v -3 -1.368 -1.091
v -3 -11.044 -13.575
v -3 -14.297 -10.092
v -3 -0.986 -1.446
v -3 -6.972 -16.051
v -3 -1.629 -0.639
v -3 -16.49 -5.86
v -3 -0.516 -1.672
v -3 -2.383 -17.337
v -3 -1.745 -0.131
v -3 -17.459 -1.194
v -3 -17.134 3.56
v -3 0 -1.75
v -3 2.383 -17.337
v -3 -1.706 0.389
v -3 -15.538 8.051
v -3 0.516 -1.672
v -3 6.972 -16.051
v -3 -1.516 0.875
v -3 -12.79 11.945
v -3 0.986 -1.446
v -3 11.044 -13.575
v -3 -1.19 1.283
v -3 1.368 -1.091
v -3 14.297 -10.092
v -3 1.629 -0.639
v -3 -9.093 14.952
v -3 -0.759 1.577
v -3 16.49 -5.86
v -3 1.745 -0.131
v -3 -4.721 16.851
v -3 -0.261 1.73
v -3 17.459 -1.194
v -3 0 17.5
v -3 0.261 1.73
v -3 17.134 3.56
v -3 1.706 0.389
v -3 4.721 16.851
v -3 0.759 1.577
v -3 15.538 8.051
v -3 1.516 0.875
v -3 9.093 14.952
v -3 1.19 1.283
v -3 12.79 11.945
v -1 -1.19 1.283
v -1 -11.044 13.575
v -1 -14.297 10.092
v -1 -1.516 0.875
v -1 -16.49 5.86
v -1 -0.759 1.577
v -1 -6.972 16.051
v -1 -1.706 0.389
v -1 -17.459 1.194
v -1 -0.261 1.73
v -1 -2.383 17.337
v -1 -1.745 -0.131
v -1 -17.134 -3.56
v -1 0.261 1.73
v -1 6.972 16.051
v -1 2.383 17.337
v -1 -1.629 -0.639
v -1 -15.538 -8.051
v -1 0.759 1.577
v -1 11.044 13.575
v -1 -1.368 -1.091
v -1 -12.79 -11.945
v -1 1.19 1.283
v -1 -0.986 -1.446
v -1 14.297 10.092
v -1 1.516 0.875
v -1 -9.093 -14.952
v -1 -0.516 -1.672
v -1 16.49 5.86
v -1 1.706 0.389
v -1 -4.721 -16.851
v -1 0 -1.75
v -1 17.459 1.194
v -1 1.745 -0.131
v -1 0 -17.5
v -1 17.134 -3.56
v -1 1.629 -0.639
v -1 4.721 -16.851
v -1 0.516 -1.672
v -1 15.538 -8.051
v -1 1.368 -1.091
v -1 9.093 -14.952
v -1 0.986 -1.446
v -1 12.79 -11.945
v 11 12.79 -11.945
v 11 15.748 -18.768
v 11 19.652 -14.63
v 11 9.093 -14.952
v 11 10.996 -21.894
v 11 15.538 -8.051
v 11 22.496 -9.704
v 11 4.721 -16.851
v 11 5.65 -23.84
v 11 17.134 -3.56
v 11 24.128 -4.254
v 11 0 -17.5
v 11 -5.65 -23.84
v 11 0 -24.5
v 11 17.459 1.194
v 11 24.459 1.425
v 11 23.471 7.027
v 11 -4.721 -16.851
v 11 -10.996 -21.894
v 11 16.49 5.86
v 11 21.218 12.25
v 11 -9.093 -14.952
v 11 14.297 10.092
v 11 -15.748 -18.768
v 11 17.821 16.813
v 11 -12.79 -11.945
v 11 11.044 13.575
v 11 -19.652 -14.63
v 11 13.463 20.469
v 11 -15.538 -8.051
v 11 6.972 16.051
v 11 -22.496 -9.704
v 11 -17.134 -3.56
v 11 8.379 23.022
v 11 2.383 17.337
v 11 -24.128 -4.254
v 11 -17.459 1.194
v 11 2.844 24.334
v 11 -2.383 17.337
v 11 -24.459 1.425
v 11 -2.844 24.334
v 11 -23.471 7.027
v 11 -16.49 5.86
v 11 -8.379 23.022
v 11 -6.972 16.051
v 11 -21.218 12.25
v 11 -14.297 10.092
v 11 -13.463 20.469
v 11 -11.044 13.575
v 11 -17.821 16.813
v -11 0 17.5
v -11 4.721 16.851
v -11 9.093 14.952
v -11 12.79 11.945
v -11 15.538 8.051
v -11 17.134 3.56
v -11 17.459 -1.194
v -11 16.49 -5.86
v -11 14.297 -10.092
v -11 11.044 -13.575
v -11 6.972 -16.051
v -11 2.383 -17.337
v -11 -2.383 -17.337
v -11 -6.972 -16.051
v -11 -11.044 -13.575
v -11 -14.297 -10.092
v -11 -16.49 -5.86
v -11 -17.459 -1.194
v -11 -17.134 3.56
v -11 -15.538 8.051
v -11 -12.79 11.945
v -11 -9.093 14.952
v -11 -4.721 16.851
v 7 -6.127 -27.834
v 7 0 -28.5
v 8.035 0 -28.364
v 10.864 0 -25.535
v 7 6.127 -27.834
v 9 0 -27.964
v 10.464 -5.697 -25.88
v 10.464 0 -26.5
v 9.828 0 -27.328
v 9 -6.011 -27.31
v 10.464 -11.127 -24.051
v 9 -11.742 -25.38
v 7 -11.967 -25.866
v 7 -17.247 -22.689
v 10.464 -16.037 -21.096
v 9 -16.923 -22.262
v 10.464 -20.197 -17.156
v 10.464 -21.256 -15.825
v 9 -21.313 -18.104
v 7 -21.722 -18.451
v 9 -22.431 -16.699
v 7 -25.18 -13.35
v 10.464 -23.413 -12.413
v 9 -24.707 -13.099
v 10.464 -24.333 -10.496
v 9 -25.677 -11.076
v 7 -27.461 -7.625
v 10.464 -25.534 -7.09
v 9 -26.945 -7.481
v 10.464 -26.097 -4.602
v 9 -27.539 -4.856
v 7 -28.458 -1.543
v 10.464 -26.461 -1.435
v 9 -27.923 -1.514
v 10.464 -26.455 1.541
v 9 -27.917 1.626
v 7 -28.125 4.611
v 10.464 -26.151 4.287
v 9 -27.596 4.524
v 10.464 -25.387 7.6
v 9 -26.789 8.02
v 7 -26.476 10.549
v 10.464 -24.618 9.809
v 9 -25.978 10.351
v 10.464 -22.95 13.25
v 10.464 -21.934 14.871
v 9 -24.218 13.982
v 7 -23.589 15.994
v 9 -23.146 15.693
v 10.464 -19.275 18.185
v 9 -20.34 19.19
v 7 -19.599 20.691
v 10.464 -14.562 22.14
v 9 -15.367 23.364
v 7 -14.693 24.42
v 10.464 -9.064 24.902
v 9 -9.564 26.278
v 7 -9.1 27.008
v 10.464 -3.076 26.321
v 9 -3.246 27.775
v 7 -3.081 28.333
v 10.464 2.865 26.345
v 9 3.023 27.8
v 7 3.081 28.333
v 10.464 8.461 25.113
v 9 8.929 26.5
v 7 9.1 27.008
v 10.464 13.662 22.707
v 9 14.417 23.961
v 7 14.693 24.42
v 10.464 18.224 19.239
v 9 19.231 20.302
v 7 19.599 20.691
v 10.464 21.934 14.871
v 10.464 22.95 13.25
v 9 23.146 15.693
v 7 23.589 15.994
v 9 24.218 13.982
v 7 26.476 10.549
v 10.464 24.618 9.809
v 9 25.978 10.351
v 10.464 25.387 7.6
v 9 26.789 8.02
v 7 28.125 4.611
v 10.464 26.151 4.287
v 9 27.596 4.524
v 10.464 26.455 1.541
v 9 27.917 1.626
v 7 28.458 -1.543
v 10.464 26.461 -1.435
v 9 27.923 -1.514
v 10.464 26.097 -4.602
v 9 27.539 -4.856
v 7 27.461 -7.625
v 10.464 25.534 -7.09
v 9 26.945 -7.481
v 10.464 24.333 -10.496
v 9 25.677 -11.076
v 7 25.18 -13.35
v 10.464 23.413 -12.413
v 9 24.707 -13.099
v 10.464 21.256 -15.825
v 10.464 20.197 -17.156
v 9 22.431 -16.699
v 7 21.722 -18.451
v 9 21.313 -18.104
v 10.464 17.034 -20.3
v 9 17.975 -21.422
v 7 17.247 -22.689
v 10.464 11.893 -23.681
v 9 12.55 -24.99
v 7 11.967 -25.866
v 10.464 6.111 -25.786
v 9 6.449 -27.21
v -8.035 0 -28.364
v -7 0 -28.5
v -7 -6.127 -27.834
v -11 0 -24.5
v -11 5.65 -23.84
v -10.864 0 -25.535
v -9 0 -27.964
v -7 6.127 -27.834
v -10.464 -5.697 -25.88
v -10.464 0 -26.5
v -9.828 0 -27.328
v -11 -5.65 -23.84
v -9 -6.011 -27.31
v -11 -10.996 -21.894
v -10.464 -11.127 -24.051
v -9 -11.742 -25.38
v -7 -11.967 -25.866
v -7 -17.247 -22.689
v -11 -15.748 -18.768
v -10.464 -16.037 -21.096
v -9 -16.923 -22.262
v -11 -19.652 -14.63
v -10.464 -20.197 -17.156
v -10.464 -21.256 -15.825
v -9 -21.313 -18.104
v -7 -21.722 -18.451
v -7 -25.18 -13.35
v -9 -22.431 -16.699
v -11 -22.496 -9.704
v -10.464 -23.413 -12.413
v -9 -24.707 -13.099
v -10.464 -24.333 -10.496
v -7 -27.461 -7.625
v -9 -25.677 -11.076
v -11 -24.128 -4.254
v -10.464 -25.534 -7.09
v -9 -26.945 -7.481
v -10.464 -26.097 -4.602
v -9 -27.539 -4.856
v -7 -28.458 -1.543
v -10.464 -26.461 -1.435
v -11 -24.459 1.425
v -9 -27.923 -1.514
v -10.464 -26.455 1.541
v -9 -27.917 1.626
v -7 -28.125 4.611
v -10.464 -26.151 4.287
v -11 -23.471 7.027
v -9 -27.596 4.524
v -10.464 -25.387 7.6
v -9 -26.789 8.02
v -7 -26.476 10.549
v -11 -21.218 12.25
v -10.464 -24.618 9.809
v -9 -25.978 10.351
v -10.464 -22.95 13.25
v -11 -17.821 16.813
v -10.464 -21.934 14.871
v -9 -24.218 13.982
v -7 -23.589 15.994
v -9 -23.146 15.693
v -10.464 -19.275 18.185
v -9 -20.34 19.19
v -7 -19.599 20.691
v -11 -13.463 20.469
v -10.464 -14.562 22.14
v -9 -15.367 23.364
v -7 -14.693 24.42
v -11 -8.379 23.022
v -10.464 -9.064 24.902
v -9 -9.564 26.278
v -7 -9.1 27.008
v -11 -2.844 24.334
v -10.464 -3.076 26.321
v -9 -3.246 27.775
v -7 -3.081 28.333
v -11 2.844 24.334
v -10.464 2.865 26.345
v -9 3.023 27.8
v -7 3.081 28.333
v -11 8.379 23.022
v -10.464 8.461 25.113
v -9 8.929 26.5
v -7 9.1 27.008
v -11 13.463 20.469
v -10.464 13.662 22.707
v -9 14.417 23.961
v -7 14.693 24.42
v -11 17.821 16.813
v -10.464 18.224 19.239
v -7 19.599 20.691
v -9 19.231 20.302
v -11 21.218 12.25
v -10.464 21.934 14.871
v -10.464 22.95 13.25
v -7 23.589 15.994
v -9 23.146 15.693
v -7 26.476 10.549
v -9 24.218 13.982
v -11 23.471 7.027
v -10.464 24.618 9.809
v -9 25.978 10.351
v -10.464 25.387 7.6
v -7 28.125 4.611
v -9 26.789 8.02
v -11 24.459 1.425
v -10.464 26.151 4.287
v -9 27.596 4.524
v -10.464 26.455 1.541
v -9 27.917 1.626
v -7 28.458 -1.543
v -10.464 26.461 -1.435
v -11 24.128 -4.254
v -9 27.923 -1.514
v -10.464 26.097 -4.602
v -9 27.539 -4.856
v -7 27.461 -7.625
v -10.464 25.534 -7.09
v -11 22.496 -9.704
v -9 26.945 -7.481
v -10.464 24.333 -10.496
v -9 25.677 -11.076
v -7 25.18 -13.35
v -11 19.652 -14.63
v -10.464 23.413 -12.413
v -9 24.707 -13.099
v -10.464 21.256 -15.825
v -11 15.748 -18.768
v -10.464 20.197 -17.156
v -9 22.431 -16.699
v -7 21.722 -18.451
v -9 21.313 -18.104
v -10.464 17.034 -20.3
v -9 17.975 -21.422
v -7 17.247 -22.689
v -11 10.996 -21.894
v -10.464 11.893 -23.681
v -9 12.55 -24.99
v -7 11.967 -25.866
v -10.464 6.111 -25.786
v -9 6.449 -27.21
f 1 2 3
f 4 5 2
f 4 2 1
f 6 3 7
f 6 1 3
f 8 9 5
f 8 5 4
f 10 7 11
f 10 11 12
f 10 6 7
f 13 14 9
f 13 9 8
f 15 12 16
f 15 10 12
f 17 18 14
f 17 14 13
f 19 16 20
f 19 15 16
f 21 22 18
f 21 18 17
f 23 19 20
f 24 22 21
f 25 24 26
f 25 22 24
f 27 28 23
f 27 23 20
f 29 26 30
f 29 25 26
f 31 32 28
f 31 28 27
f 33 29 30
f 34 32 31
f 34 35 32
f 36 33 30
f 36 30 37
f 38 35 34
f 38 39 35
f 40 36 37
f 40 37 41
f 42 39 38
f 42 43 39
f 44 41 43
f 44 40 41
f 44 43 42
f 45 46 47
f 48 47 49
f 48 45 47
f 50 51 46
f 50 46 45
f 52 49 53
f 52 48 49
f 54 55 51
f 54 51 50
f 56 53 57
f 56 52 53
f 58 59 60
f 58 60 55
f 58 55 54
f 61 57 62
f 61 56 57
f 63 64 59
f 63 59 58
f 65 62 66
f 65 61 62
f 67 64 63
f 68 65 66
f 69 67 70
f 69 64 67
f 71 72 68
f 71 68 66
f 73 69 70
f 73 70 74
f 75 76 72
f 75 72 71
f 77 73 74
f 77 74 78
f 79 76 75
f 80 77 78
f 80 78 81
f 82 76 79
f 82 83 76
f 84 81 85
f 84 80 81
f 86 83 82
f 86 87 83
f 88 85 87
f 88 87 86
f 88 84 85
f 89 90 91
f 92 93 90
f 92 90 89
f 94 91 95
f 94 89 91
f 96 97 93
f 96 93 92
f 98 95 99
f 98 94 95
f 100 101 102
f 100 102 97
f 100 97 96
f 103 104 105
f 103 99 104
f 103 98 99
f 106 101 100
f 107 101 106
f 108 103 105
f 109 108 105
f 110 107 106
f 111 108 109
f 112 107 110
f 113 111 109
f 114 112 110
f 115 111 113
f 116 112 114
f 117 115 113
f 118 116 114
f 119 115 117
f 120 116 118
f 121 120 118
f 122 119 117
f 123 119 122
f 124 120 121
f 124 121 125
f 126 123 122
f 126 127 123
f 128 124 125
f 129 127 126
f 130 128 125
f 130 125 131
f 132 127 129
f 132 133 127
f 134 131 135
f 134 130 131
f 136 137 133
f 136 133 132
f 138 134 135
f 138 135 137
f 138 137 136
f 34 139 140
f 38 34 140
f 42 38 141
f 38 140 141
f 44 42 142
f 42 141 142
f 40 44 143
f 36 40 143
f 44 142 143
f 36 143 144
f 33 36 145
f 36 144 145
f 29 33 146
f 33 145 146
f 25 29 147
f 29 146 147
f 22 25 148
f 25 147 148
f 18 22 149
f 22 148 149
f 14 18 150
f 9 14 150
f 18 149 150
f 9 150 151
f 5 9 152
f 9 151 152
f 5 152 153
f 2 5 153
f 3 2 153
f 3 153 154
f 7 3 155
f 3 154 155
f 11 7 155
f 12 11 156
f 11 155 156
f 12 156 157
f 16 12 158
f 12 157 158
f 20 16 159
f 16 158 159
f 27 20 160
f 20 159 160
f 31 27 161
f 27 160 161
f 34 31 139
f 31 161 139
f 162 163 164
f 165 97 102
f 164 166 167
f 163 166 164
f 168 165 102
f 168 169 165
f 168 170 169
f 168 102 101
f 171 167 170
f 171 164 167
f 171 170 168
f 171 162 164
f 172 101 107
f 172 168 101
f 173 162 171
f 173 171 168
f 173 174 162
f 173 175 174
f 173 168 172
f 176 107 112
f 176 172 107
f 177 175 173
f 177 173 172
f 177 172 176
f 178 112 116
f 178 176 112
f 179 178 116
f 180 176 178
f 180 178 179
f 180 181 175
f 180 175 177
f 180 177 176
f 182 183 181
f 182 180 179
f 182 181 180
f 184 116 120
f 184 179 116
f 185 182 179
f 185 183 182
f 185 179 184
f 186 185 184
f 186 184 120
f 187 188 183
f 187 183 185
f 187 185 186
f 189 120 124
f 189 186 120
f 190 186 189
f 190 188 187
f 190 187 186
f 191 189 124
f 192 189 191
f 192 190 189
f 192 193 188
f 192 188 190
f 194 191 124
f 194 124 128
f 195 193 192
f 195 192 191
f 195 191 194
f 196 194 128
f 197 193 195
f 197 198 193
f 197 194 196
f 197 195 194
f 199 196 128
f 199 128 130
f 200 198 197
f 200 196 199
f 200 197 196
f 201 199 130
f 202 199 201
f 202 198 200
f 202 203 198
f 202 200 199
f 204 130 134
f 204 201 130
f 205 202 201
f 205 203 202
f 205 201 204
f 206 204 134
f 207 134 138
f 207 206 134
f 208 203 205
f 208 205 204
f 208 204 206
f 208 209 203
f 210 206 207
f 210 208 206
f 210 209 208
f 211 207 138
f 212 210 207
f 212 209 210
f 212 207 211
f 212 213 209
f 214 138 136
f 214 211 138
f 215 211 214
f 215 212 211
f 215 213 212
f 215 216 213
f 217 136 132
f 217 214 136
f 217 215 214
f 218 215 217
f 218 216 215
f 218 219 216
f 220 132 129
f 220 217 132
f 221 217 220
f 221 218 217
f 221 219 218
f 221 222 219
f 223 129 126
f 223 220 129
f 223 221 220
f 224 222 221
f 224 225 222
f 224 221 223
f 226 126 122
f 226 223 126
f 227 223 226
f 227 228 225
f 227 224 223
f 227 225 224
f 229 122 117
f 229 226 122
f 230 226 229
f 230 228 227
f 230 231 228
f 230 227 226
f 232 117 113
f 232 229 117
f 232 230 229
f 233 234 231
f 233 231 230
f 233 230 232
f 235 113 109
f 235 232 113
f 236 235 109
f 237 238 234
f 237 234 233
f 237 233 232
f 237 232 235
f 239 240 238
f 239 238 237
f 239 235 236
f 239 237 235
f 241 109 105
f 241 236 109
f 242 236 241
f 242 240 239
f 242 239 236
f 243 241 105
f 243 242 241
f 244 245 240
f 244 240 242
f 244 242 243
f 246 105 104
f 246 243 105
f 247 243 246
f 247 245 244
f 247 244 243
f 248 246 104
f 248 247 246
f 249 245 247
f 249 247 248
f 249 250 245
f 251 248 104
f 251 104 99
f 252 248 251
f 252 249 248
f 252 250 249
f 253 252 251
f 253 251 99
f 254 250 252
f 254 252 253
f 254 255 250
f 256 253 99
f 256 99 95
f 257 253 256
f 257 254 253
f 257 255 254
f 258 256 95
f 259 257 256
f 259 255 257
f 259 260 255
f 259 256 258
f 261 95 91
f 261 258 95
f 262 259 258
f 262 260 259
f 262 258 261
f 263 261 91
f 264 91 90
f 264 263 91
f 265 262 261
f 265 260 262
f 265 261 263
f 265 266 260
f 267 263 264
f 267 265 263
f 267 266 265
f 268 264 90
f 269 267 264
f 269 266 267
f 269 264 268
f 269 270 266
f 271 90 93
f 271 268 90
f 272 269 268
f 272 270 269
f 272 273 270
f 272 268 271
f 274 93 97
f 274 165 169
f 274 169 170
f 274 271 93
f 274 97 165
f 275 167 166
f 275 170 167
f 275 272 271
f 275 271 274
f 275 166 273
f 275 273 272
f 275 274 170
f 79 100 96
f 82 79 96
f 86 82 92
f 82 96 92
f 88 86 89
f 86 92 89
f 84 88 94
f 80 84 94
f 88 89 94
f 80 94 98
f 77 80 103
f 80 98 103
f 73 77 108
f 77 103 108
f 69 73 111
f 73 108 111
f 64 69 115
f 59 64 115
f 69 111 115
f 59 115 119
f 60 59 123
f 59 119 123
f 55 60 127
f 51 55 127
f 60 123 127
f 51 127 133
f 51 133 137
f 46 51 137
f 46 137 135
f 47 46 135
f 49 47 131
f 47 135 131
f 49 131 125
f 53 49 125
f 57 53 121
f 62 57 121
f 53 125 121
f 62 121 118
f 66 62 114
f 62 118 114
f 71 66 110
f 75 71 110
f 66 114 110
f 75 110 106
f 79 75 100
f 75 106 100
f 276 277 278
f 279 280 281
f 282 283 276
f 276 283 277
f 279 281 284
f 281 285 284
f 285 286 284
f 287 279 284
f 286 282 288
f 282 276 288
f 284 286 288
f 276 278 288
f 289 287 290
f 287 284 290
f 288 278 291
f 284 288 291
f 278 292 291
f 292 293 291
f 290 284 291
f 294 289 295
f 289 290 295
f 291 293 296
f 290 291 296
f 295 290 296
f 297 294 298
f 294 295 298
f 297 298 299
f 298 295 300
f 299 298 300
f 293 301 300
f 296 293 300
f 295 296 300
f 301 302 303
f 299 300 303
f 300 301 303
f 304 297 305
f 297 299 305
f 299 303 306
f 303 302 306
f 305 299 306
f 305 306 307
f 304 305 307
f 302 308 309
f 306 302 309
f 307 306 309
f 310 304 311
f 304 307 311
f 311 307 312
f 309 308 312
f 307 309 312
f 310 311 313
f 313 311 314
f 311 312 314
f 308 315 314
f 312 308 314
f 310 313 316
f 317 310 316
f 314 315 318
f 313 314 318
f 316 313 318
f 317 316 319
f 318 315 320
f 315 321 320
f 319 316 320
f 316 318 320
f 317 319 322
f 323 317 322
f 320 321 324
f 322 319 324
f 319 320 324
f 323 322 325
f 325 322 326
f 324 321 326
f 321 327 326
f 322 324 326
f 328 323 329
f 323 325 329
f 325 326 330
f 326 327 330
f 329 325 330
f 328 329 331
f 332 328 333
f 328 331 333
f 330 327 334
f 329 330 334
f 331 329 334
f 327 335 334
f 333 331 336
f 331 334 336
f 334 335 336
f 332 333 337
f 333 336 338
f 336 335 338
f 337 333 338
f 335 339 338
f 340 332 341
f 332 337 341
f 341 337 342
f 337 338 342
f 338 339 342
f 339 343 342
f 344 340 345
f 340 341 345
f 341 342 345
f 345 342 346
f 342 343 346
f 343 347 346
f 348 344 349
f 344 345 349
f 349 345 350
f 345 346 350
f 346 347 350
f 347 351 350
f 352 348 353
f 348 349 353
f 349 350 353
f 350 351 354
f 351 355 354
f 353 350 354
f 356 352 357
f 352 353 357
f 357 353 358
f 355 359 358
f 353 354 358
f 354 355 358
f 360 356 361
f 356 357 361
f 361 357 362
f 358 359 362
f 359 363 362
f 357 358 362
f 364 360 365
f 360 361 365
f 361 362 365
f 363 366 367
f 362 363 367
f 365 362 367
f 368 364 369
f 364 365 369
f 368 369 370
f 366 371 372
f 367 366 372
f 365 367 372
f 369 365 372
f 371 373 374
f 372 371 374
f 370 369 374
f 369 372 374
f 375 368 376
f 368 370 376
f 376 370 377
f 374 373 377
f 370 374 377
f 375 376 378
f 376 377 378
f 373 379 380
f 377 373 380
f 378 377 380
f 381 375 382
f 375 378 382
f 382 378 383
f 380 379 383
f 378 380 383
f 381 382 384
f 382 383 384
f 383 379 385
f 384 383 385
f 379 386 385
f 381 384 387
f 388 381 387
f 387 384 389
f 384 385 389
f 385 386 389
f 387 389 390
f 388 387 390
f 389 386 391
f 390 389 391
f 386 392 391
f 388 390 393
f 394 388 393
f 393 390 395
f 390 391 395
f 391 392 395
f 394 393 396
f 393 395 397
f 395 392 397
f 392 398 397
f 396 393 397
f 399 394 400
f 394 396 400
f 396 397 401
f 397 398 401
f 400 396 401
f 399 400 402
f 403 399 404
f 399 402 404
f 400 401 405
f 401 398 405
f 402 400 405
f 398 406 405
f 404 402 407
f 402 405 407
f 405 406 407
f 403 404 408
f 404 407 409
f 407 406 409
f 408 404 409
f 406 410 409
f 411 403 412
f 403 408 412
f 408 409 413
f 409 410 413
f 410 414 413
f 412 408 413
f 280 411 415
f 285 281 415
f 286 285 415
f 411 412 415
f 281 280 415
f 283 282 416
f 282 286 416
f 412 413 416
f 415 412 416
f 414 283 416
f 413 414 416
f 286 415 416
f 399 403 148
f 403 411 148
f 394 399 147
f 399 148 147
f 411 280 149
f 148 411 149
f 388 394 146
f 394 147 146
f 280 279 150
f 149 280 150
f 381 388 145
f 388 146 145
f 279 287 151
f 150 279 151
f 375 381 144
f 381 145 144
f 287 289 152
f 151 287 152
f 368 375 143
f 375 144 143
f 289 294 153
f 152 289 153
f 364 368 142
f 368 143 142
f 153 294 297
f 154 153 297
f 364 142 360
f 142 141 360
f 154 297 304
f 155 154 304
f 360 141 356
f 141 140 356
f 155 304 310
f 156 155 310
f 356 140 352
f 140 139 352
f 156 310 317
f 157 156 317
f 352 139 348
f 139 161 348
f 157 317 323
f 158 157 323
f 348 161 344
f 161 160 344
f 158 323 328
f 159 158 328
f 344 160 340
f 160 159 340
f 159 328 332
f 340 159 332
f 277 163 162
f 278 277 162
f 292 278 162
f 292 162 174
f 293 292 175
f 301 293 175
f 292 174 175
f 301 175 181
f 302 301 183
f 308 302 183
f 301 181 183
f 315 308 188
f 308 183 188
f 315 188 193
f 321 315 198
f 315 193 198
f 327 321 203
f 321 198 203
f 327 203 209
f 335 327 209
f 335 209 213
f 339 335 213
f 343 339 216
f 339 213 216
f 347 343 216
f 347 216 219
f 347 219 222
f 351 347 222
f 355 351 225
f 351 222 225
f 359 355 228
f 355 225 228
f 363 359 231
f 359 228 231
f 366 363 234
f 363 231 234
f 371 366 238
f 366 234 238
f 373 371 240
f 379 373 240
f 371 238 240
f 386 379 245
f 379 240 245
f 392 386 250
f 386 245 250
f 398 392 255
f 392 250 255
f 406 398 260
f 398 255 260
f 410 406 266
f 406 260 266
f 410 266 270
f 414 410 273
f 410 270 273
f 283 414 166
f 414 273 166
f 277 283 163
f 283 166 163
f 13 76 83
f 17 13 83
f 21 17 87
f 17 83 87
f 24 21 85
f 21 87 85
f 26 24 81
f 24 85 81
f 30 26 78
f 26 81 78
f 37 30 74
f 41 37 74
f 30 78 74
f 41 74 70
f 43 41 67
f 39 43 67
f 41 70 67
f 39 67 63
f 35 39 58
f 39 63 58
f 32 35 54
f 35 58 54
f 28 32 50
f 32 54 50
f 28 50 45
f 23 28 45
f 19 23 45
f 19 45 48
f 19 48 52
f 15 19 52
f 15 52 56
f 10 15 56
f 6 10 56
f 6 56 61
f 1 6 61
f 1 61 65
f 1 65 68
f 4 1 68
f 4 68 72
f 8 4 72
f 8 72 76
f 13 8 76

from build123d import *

# Parameters (mm, degrees)
SKETCH1_W          = 22
SKETCH1_H          = 28.5
FILLET1_R          = 4
SKETCH2_R          = 17.5
CUT_EXTRUDE1_DEPTH = 12
SKETCH3_R          = 17.5
CUT_EXTRUDE2_DEPTH = 8
SKETCH4_R          = 1.75
CUT_EXTRUDE3_DEPTH = 11


with BuildPart() as part:
    # Sketch1 → Revolve1 (revolve)
    with BuildSketch(Plane(origin=(0, 0, 0), x_dir=(1, 0, 0), z_dir=(0, 1, 0))):
        with Locations((0, 14.25)):
            Rectangle(SKETCH1_W, SKETCH1_H)
    revolve(axis=Axis((11, 0, 0), (-1, 0, 0)))

    # Fillet1
    fillet1_edges = [part.edges().sort_by_distance(p)[0] for p in [
        (11, 0, 28.5),
        (-11, 0, 28.5),
    ]]
    fillet(fillet1_edges, radius=FILLET1_R)

    # Sketch2 → Cut-Extrude1 (cut)
    with BuildSketch(Plane(origin=(11, 0, 0), x_dir=(0, 0, -1), z_dir=(1, 0, 0))):
        Circle(SKETCH2_R)
    extrude(amount=-CUT_EXTRUDE1_DEPTH, mode=Mode.SUBTRACT)

    # Sketch3 → Cut-Extrude2 (cut)
    with BuildSketch(Plane.ZY.offset(11)):
        Circle(SKETCH3_R)
    extrude(amount=-CUT_EXTRUDE2_DEPTH, mode=Mode.SUBTRACT)

    # Sketch4 → Cut-Extrude3 (cut, through all)
    with BuildSketch(Plane(origin=(-1, 0, 0), x_dir=(0, 0, -1), z_dir=(1, 0, 0))):
        Circle(SKETCH4_R)
    extrude(amount=-CUT_EXTRUDE3_DEPTH, mode=Mode.SUBTRACT)


solid = part.part
